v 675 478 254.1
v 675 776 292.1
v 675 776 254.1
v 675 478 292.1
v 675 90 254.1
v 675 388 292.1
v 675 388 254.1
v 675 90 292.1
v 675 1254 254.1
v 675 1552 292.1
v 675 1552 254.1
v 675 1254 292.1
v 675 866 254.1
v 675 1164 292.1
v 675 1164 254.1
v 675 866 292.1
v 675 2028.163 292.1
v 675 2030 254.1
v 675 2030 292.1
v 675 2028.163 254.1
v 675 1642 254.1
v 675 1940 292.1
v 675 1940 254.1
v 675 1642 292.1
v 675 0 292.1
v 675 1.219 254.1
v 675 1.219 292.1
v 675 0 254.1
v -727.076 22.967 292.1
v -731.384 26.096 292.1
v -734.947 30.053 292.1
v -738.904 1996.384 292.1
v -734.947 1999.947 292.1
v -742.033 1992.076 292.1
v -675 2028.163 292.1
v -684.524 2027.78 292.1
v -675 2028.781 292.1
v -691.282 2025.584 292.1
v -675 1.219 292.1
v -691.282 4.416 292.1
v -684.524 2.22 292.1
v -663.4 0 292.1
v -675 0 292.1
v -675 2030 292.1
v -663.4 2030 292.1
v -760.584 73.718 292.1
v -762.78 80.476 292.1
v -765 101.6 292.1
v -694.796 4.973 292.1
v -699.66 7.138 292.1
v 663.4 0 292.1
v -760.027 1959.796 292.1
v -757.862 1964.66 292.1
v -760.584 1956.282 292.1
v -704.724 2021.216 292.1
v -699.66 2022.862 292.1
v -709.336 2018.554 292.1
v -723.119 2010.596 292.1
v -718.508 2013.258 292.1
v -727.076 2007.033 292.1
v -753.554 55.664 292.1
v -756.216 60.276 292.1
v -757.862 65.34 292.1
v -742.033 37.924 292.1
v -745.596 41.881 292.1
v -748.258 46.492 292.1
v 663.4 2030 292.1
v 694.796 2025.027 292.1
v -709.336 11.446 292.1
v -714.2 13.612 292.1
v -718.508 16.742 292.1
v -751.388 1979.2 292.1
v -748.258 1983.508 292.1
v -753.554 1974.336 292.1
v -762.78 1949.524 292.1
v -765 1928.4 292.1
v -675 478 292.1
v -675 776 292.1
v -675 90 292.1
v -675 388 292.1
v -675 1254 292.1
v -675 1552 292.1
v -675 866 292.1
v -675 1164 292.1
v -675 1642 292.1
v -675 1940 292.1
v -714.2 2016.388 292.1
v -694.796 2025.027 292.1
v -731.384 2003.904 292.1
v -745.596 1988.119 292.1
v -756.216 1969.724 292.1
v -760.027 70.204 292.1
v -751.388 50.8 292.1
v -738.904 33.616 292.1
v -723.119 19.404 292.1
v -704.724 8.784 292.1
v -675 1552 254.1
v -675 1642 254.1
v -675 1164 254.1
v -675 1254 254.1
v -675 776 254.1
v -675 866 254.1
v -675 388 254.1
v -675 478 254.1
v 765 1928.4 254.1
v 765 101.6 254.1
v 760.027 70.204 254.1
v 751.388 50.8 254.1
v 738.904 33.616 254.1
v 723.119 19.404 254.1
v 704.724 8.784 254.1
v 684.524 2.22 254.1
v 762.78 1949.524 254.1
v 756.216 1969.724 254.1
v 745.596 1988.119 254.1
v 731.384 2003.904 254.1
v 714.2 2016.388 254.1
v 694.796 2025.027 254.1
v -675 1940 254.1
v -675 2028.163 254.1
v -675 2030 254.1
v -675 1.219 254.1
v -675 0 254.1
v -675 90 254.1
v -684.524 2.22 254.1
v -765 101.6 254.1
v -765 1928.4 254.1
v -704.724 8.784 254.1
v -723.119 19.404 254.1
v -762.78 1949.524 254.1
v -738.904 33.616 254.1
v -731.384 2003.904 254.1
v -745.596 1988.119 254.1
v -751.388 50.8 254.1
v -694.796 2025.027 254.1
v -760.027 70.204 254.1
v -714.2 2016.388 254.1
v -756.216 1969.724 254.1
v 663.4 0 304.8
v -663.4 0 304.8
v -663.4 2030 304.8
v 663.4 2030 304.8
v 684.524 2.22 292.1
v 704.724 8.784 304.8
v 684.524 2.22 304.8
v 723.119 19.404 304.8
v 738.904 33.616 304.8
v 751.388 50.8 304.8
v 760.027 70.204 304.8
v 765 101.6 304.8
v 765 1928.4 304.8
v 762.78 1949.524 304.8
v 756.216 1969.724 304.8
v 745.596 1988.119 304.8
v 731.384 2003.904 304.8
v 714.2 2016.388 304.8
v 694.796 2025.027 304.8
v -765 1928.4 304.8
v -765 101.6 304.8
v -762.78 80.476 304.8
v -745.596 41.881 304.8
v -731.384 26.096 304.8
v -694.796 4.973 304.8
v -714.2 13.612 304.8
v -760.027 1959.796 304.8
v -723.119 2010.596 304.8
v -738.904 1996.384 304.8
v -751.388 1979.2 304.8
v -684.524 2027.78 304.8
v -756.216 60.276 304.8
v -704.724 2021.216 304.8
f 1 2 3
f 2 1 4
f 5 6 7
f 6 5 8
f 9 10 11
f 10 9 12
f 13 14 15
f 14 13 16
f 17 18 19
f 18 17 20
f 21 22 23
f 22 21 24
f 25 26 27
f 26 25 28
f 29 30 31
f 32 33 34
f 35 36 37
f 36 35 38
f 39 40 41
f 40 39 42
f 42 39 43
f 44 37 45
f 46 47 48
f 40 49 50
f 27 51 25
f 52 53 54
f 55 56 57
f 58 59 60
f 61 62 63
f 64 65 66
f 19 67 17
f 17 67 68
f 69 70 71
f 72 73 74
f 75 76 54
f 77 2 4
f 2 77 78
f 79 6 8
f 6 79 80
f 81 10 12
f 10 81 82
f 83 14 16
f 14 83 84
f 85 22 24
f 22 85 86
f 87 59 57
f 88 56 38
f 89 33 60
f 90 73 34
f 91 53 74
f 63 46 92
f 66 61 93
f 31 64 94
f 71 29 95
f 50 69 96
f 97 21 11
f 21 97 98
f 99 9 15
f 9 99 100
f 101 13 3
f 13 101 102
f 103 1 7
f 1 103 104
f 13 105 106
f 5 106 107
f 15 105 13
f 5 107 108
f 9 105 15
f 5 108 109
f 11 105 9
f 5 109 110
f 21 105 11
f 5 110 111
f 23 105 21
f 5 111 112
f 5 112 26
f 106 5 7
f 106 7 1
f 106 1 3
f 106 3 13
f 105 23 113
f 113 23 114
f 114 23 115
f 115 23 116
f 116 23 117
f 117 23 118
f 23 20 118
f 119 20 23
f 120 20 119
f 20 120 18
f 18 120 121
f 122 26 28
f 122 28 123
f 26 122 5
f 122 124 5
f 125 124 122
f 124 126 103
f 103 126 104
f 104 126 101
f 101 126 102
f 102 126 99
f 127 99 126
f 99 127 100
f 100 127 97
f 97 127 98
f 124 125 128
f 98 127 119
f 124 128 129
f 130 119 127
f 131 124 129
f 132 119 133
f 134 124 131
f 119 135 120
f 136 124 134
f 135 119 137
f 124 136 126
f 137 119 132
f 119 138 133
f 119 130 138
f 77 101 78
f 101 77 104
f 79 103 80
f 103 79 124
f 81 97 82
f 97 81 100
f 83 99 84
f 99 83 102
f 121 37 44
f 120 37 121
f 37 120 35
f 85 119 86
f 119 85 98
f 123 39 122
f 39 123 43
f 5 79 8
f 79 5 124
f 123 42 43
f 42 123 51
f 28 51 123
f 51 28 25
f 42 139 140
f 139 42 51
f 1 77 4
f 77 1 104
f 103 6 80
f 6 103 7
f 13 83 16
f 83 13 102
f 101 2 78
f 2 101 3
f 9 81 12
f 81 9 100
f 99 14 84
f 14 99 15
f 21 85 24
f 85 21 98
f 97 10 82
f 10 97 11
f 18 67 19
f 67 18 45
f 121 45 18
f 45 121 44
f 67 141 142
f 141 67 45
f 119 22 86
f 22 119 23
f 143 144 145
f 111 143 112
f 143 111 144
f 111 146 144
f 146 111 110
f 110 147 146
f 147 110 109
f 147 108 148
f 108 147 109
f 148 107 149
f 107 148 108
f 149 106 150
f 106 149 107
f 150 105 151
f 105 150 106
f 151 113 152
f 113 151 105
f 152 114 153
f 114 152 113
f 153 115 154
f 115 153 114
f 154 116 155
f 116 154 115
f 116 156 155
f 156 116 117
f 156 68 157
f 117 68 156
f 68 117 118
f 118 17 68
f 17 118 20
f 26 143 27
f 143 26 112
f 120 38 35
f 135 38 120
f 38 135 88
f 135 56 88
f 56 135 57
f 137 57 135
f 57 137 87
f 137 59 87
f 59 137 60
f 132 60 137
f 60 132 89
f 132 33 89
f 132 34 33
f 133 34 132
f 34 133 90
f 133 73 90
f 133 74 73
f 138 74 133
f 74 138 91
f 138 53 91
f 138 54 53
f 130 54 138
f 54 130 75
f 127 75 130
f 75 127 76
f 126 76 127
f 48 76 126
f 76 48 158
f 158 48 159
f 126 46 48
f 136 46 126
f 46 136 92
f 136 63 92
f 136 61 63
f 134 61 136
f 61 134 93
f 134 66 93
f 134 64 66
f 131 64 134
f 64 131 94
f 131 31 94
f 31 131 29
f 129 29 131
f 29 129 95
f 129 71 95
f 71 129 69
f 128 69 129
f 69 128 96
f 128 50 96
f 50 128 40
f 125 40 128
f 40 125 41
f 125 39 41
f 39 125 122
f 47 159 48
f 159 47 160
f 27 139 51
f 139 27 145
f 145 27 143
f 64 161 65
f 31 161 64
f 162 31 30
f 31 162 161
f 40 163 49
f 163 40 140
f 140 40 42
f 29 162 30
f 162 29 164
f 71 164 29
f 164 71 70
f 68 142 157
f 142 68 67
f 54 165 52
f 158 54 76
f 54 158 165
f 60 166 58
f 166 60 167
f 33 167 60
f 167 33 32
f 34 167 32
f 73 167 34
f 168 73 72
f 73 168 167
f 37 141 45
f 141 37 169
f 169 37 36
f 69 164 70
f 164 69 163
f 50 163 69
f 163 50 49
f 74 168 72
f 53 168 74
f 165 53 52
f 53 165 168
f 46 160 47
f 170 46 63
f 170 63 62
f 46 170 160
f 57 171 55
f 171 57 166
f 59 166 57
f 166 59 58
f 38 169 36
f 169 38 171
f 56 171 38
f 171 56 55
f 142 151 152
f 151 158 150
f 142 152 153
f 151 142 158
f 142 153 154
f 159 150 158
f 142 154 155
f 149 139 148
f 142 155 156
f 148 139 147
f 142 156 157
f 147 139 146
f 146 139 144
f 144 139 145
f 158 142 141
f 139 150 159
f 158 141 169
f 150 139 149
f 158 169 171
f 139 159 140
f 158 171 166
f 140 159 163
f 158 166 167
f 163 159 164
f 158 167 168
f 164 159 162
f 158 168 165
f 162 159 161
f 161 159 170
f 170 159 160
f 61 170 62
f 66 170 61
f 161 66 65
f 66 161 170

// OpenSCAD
// file: common.scad
pad=0.1;
in=25.4;
zero=0.01;

wood=in/2;
// 2x4 actual dimensions
two=38;
four=90;

module corner(r) {
	offset(r*2)
	offset(-r*2)
	children();
}

module wood(w=wood) {
	linear_extrude(height=w)
	children();
}

module dirror_y(y=0) {
	children();
	translate([0,y])
	mirror([0,1])
	children();

}

module dirror_x(x=0) {
	children();
	translate([x,0])
	mirror([1,0])
	children();

}
// main file
include <common.scad>
bed_wood=wood;

bed_x=1530;
bed_y=2030;
bed_z=12*in;
bed_r=5*in;

mattress_r=2*in;

overhang=10*in;
spines=6;
spine_end=0;
spine_gap=(bed_y-four-spine_end*2)/(spines-1);


module bed() {
	translate([-bed_x/2,0])
	corner(mattress_r)
	square([bed_x,bed_y]);
}

module top() {
	color("blue")
	translate([0,0,bed_z-bed_wood])
	wood(bed_wood)
	bed();
}

module bed_ribs() {
	color("red")
	//for(y=[back_overhang:spine_gap:bed_y-overhang])
	for(y=[spine_end+wood:spine_gap:bed_y-spine_end])
	translate([four-bed_x/2,y-wood,bed_z-bed_wood-two])
	cube([bed_x-four*2,four,two]);
}

module side_rails() {
	color("magenta")
	translate([0,0,bed_z-bed_wood-two])
	linear_extrude(height=two)
	dirror_x()
	intersection() {
		bed();
		translate([bed_x/2-four,-pad])
		square([four,bed_y+pad*2]);
	}
}

module top_handcut() {
	bed_ribs();
	side_rails();
}

top();
top_handcut();
